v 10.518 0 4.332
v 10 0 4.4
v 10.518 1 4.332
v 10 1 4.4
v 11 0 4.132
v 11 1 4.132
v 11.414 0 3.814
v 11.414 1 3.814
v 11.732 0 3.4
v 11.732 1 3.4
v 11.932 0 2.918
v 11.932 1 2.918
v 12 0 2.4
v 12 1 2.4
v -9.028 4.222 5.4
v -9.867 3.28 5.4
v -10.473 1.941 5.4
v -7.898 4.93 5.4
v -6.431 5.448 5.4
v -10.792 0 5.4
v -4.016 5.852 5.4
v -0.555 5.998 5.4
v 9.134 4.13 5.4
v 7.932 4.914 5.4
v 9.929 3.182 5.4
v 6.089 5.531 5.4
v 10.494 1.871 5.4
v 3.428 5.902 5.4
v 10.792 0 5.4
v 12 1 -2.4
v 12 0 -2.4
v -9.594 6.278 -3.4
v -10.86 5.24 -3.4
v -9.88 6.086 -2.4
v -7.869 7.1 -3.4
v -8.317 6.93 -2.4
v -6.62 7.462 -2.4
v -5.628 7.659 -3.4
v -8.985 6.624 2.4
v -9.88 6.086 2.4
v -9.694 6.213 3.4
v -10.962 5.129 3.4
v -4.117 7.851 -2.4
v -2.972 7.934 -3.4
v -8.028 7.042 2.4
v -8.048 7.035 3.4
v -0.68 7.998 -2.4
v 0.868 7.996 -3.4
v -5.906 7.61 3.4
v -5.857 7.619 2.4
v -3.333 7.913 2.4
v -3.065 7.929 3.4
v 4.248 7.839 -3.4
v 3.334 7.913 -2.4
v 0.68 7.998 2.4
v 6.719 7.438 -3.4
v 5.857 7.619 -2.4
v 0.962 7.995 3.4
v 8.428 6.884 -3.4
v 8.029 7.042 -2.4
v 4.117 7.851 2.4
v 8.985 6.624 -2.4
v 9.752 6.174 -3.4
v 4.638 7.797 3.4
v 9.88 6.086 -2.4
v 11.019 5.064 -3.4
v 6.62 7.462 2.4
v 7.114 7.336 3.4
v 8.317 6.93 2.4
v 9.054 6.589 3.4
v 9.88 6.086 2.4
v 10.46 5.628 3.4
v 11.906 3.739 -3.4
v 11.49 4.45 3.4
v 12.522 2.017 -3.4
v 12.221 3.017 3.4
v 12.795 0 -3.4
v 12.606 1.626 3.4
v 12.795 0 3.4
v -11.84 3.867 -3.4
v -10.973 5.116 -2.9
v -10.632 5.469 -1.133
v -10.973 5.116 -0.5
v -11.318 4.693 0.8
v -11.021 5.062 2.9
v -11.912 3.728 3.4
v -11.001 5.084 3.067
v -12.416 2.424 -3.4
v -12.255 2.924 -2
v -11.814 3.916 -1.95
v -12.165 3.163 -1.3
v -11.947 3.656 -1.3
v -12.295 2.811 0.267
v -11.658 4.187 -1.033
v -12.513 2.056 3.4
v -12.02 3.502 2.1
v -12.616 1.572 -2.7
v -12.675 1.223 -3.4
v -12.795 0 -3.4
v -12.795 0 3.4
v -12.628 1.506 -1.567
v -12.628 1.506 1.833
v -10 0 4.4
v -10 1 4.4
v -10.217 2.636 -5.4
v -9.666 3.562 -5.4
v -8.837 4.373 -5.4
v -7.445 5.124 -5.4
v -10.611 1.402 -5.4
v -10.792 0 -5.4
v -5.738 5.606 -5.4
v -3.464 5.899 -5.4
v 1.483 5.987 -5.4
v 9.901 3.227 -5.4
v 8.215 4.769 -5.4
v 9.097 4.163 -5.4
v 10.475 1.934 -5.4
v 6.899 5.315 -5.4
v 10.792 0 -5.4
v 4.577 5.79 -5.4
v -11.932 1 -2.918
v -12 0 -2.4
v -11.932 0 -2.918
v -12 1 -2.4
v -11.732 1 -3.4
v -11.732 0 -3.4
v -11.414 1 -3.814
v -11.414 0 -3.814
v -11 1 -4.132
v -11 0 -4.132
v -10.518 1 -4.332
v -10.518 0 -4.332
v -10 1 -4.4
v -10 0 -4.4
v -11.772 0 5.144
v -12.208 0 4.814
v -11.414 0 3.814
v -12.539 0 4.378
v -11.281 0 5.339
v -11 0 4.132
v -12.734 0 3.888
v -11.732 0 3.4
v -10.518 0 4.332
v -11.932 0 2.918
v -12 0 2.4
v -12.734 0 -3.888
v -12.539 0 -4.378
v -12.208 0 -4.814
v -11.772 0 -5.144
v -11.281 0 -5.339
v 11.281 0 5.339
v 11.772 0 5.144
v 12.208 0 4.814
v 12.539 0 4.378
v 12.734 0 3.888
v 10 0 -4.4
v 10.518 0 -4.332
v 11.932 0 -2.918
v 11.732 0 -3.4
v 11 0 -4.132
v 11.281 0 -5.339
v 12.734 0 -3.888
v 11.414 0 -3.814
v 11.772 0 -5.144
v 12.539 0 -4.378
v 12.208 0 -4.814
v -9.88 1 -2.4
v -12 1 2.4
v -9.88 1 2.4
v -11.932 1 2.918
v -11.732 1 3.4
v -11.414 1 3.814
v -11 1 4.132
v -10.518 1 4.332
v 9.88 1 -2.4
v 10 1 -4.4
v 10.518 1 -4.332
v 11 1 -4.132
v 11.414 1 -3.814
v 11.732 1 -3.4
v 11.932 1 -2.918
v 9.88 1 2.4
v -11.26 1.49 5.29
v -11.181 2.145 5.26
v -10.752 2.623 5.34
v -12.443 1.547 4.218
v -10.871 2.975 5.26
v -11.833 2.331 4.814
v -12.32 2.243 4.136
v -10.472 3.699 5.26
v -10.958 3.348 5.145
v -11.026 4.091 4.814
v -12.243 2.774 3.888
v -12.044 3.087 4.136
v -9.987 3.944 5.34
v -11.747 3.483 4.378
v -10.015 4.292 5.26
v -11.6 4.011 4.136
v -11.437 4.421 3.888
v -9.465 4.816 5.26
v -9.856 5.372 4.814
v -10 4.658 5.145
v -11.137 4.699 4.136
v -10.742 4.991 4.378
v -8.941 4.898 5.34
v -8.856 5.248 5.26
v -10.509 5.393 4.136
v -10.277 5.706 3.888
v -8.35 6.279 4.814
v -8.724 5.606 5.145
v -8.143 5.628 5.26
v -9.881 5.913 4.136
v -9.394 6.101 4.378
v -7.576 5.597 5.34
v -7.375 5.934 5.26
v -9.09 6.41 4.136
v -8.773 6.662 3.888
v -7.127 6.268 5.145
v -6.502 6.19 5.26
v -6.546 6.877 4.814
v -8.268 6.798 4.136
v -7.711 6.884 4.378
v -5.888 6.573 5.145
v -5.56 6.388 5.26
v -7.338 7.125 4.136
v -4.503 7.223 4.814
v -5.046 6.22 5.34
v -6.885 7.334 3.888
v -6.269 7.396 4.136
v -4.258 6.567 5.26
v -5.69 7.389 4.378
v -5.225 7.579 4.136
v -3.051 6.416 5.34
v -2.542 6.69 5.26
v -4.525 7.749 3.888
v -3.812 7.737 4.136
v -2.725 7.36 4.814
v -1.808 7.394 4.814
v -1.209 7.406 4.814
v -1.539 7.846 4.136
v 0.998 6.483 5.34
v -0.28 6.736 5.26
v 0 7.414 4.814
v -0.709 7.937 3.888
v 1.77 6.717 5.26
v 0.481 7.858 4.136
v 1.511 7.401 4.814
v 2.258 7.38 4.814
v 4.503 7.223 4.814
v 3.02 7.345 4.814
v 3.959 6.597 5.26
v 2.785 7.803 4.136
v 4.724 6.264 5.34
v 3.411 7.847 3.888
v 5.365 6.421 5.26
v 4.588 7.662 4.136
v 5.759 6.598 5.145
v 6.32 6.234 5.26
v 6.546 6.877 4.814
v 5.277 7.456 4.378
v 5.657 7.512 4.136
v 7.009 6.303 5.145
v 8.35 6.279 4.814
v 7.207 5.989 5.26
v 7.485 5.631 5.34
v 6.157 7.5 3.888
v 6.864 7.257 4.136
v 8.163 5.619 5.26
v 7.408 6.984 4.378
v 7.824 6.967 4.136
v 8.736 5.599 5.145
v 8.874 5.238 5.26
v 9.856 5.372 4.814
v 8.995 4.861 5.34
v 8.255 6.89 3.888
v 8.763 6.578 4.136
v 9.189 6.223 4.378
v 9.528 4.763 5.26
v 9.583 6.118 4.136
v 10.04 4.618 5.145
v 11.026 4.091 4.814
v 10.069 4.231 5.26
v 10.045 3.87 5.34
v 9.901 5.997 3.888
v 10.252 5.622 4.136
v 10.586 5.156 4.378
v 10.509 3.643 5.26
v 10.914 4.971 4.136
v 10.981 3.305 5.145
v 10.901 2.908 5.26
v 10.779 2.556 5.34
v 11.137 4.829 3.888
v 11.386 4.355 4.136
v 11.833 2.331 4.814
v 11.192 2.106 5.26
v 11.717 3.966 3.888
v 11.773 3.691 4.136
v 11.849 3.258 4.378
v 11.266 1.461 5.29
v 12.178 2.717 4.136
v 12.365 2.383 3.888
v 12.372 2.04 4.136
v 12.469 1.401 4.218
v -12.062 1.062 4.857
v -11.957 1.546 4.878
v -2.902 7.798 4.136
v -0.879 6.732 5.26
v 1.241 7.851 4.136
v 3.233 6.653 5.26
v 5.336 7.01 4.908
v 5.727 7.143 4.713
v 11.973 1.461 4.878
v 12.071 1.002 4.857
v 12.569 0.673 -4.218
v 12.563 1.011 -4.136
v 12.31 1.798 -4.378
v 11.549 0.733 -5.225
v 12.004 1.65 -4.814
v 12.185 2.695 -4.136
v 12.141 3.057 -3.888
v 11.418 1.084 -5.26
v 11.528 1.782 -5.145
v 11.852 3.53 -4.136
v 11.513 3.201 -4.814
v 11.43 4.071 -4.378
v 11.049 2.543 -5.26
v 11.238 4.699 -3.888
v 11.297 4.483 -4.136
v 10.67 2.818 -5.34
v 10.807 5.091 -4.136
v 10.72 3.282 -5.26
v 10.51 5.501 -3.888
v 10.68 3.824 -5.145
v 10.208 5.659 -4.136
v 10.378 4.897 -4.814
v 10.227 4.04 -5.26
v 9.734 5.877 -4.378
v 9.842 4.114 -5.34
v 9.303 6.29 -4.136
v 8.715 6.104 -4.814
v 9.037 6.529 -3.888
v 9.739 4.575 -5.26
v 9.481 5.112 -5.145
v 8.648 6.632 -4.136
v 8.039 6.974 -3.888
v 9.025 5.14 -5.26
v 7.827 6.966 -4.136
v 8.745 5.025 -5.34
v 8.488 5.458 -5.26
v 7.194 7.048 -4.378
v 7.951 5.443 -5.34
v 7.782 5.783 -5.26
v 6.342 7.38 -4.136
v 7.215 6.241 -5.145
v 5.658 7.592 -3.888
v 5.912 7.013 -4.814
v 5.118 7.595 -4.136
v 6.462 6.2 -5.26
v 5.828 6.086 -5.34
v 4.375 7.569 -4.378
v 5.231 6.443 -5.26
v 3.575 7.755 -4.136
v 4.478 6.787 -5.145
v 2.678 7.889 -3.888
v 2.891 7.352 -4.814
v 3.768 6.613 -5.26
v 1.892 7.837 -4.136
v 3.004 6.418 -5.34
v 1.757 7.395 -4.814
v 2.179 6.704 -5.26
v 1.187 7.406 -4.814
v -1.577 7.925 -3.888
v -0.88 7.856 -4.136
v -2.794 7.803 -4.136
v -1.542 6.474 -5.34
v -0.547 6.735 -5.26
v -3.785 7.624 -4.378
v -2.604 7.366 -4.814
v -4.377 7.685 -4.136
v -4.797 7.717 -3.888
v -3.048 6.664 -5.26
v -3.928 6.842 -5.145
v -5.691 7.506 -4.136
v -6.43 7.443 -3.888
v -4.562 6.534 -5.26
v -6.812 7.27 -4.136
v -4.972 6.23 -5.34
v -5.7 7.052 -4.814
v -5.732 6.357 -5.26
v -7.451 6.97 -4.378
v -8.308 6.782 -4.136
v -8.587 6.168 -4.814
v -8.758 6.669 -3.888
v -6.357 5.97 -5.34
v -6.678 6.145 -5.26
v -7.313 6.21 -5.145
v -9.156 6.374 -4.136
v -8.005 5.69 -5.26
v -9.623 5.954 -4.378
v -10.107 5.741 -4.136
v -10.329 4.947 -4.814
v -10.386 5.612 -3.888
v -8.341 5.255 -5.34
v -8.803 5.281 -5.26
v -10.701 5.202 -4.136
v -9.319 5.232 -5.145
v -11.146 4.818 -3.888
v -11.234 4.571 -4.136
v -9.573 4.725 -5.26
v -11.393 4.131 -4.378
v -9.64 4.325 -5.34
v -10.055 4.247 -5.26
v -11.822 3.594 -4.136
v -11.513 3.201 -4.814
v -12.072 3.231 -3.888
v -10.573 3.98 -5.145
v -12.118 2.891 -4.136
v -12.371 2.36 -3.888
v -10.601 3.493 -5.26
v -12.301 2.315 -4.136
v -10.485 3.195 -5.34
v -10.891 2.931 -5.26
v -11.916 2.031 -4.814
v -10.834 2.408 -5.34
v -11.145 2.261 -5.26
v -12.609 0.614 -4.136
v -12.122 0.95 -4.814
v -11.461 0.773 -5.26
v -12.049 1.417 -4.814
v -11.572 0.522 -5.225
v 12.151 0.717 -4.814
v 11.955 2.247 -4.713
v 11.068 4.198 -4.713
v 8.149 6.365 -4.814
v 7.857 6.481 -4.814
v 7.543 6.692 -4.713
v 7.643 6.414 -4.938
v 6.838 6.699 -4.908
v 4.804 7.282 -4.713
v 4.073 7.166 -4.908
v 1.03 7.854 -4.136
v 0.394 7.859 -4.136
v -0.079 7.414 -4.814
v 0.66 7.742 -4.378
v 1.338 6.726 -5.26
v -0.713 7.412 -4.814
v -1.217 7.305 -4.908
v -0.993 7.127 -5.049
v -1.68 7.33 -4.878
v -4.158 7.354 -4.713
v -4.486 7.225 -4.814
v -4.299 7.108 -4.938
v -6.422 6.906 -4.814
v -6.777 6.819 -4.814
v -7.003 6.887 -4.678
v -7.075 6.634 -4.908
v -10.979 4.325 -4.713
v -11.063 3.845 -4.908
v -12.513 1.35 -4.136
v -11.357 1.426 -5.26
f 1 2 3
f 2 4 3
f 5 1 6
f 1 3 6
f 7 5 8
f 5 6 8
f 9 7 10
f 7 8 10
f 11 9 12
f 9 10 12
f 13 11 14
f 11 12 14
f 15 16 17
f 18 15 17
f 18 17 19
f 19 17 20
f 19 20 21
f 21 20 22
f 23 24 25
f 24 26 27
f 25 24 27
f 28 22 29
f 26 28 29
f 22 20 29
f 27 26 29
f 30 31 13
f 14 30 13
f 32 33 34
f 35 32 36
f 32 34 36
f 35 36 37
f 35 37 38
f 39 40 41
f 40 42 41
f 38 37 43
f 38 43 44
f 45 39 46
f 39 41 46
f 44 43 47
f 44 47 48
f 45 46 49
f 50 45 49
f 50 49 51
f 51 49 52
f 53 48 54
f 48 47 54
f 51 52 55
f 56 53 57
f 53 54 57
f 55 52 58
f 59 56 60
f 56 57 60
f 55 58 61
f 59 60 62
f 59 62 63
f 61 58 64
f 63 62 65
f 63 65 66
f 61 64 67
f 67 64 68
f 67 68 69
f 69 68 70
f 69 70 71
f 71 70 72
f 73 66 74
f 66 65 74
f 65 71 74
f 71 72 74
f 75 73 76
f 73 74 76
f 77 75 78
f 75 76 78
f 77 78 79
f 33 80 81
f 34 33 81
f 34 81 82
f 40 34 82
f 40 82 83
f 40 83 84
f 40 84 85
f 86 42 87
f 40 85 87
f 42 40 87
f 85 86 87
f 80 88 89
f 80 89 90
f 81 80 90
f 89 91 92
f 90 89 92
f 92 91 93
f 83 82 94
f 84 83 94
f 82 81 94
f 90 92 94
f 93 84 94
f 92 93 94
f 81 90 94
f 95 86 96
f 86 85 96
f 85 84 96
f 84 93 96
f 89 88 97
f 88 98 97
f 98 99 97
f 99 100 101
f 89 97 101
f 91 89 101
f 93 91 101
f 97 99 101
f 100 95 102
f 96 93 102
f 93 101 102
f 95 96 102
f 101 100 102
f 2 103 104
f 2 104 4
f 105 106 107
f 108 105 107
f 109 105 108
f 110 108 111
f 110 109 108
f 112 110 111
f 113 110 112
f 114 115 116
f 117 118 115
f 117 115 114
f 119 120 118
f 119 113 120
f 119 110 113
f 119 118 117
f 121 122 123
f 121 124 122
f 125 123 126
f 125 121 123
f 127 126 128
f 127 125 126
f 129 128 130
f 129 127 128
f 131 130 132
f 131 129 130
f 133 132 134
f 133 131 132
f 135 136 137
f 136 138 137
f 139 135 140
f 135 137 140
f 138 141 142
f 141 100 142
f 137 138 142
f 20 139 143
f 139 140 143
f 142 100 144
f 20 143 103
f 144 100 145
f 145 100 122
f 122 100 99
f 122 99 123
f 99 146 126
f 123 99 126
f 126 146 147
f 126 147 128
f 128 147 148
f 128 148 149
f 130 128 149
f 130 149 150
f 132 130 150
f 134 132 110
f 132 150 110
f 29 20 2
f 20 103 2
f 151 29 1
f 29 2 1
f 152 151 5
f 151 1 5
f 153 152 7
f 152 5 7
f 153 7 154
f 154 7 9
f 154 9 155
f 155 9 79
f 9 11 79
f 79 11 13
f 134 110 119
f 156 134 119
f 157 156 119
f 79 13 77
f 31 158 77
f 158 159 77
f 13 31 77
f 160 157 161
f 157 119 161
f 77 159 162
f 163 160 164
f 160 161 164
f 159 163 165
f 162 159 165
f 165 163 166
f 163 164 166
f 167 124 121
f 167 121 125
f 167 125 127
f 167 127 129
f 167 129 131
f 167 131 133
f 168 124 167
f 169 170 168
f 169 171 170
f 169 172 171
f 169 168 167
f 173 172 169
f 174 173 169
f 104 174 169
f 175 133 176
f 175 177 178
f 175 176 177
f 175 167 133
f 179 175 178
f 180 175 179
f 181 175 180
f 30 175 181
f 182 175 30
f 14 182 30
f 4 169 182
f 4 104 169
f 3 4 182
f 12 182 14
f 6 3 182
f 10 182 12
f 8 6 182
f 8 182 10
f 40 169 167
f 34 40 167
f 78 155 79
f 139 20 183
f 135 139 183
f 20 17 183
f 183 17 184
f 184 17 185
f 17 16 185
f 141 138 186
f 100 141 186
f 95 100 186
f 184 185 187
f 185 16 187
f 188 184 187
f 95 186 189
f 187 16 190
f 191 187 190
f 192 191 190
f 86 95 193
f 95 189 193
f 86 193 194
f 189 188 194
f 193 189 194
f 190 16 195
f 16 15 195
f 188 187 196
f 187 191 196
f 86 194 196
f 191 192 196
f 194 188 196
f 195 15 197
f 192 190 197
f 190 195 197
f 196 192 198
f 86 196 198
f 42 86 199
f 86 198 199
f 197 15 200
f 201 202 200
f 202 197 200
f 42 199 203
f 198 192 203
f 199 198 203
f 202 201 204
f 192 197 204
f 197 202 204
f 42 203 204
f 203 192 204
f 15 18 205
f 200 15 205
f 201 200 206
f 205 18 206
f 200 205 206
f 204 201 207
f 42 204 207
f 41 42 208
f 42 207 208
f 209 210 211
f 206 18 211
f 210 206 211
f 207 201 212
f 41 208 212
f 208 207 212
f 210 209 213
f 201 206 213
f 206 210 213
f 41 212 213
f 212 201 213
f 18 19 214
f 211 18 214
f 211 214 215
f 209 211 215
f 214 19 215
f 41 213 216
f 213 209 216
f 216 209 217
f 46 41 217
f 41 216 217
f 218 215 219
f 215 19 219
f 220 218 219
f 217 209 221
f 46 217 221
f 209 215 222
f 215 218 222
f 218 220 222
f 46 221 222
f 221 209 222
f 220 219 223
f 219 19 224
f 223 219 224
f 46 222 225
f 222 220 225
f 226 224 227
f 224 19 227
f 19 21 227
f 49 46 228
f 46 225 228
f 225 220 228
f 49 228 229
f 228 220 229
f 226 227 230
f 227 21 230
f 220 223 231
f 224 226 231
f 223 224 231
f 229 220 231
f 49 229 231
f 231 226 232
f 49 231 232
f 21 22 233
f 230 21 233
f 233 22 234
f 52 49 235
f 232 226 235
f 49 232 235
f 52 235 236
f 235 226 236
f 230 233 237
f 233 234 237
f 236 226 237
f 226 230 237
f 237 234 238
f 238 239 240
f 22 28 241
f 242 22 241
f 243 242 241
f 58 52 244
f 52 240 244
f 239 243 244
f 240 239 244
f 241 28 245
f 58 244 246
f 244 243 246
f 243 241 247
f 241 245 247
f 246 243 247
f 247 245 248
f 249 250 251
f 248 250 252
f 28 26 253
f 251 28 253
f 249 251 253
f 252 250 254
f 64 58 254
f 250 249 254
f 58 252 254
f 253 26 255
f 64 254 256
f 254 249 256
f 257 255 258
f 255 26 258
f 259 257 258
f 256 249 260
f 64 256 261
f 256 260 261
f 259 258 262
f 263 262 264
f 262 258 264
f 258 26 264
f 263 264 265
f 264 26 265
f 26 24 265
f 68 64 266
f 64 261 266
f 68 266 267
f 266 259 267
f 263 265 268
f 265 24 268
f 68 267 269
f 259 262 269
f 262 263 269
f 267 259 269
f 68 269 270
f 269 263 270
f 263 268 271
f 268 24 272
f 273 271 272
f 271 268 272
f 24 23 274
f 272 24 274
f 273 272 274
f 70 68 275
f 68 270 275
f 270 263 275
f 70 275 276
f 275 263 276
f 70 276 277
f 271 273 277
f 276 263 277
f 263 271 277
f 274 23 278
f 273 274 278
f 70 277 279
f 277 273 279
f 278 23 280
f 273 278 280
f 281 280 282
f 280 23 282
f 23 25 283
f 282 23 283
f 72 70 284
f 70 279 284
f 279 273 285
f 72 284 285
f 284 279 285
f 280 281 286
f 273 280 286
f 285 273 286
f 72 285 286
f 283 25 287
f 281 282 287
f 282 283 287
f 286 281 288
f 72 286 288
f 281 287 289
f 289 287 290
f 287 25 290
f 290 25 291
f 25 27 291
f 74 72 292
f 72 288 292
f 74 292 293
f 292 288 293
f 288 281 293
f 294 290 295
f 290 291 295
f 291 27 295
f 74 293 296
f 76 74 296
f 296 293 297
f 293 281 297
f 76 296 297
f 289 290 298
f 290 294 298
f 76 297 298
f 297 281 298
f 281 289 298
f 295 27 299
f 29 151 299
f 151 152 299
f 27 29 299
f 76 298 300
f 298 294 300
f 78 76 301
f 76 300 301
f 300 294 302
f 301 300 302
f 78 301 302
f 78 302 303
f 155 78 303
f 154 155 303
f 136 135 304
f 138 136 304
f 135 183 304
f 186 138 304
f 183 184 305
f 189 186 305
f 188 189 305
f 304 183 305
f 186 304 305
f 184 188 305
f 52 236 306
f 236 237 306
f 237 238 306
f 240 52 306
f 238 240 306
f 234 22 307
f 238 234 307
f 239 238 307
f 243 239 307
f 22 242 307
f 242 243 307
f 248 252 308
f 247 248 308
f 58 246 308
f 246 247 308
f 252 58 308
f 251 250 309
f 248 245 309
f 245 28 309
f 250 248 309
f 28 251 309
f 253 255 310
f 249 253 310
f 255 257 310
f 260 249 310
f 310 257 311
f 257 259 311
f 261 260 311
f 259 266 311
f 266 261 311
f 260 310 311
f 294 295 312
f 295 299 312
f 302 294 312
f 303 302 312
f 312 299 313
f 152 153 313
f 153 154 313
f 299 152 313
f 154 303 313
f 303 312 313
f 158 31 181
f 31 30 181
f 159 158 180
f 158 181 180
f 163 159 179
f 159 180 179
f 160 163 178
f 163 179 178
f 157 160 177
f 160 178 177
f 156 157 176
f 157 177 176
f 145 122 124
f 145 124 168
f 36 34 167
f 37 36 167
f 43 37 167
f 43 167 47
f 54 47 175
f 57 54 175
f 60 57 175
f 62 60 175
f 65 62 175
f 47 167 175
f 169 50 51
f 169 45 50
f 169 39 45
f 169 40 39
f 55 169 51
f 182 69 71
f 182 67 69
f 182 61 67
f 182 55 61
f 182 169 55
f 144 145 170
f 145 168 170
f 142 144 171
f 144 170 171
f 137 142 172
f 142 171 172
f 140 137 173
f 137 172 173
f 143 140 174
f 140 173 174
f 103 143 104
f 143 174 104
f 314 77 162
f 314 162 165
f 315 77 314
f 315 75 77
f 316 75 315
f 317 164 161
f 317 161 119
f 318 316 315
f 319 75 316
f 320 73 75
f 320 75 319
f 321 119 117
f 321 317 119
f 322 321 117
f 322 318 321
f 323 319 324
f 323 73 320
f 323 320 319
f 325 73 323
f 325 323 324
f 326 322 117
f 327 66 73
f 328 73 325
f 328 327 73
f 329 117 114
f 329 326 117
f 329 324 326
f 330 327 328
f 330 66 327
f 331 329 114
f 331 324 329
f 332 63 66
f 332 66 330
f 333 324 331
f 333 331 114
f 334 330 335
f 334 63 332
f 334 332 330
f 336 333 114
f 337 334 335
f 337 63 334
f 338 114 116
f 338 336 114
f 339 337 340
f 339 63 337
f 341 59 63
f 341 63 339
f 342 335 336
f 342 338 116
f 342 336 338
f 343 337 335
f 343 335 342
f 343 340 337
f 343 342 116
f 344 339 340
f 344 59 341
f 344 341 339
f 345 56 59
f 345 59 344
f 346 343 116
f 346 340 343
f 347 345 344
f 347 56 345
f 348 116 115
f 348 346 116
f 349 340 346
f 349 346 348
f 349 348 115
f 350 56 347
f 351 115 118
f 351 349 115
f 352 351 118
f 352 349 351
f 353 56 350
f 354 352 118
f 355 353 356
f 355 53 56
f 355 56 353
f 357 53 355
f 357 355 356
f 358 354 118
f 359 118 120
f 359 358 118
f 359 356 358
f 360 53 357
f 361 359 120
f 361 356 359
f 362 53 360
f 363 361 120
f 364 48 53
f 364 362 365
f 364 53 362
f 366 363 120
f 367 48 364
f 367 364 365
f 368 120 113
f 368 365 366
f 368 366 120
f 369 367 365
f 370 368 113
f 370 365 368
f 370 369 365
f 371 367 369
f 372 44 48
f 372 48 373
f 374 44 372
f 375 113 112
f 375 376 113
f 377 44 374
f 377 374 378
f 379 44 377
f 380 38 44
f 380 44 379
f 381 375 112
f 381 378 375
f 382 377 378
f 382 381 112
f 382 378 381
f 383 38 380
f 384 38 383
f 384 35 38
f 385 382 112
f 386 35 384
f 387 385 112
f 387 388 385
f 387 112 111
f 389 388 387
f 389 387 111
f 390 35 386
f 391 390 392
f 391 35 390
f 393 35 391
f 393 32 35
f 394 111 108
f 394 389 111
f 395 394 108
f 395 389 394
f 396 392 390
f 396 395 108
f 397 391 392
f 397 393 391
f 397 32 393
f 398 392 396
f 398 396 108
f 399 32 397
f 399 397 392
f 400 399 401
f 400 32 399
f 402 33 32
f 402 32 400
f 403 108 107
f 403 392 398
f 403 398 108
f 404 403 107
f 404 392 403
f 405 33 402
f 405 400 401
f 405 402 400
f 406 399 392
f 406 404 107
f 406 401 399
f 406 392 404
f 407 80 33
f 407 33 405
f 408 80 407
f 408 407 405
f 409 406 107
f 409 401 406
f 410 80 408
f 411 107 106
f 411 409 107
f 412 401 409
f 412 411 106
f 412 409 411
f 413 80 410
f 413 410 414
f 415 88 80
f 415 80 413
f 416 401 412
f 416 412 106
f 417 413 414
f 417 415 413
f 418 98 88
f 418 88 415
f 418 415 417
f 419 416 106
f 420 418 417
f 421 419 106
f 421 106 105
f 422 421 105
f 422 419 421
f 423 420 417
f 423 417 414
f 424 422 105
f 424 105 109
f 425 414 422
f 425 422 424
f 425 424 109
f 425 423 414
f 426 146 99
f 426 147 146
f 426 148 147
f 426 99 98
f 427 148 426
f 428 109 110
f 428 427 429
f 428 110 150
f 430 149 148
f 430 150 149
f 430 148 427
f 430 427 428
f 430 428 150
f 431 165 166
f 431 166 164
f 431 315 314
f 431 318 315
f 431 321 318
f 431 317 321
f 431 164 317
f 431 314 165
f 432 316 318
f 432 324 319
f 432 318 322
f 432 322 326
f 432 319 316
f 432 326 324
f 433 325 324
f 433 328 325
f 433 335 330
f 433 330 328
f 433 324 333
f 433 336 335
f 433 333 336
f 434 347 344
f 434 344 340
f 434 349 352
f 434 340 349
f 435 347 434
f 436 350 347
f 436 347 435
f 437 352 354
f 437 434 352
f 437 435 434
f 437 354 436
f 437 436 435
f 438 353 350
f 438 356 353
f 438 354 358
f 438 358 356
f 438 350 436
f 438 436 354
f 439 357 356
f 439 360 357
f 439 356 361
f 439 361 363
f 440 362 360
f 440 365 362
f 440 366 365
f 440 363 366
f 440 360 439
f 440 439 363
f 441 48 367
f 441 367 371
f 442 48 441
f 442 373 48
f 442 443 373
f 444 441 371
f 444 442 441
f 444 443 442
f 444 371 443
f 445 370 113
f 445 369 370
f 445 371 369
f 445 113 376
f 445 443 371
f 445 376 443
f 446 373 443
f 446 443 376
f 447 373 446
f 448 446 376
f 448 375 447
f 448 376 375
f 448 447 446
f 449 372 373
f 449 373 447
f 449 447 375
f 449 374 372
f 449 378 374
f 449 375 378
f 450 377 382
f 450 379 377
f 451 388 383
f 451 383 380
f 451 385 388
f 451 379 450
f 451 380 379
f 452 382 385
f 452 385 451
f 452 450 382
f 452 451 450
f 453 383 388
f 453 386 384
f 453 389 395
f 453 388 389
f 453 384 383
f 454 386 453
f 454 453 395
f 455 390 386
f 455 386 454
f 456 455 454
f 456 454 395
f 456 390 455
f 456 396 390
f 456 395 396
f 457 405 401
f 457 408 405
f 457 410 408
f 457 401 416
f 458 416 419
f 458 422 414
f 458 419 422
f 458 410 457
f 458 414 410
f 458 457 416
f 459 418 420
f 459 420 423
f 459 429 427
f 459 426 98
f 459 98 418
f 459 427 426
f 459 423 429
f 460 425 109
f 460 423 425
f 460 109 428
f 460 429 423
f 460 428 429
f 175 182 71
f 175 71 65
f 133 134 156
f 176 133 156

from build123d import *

# Parameters (mm, degrees)
SKETCH1_W           = 25.59
SKETCH1_H           = 10.8
SKETCH1_W_2         = 19.76
SKETCH1_H_2         = 4.8
BOSS_EXTRUDE1_DEPTH = 8
CUT_EXTRUDE3_DEPTH  = 11.8
FILLET2_R           = 2
FILLET3_R           = 2
SKETCH3_W           = 24
SKETCH3_H           = 8.8
CUT_EXTRUDE2_DEPTH  = 1
FILLET4_R           = 2


with BuildPart() as part:
    # Sketch1 → Boss-Extrude1 (new body)
    with BuildSketch(Plane(origin=(0, 0, 0), x_dir=(1, 0, 0), z_dir=(0, 1, 0))):
        Rectangle(SKETCH1_W, SKETCH1_H)
        Rectangle(SKETCH1_W_2, SKETCH1_H_2, mode=Mode.SUBTRACT)
    extrude(amount=BOSS_EXTRUDE1_DEPTH)

    # Sketch4 → Cut-Extrude3 (cut, through all)
    with BuildSketch(Plane.XY.offset(5.4)):
        with BuildLine():
            Line((-12.795, 0), (-12.795, 9.131507451))
            Line((-12.795, 9.131507451), (12.795, 9.131507451))
            Line((12.795, 9.131507451), (12.795, 0))
            add(Edge.make_bspline(
                [(-12.795, 0), (-12.426580691, 7.502461836), (0, 8.497538164), (12.426580691, 7.502461836), (12.795, 0)],
                knots=[0, 0, 0, 0, 0.5, 1, 1, 1, 1], degree=3))
        make_face()
    extrude(amount=-CUT_EXTRUDE3_DEPTH, mode=Mode.SUBTRACT)

    # Fillet2
    fillet2_edges = [part.edges().sort_by_distance(p)[0] for p in [
        (8.47733972, 6.862563229, 5.4),
        (-8.477340259, 6.862562997, 5.4),
    ]]
    fillet(fillet2_edges, radius=FILLET2_R)

    # Fillet3
    fillet3_edges = [part.edges().sort_by_distance(p)[0] for p in [
        (8.47734001, 6.862563107, -5.4),
        (-8.477339964, 6.862563119, -5.4),
    ]]
    fillet(fillet3_edges, radius=FILLET3_R)

    # Sketch3 → Cut-Extrude2 (cut)
    with BuildSketch(Plane.XZ):
        Rectangle(SKETCH3_W, SKETCH3_H)
    extrude(amount=-CUT_EXTRUDE2_DEPTH, mode=Mode.SUBTRACT)

    # Fillet4
    fillet4_edges = [part.edges().sort_by_distance(p)[0] for p in [
        (12, 0.5, 4.4),
        (12, 0.5, -4.4),
        (-12, 0.5, -4.4),
        (-12, 0.5, 4.4),
    ]]
    fillet(fillet4_edges, radius=FILLET4_R)


solid = part.part
